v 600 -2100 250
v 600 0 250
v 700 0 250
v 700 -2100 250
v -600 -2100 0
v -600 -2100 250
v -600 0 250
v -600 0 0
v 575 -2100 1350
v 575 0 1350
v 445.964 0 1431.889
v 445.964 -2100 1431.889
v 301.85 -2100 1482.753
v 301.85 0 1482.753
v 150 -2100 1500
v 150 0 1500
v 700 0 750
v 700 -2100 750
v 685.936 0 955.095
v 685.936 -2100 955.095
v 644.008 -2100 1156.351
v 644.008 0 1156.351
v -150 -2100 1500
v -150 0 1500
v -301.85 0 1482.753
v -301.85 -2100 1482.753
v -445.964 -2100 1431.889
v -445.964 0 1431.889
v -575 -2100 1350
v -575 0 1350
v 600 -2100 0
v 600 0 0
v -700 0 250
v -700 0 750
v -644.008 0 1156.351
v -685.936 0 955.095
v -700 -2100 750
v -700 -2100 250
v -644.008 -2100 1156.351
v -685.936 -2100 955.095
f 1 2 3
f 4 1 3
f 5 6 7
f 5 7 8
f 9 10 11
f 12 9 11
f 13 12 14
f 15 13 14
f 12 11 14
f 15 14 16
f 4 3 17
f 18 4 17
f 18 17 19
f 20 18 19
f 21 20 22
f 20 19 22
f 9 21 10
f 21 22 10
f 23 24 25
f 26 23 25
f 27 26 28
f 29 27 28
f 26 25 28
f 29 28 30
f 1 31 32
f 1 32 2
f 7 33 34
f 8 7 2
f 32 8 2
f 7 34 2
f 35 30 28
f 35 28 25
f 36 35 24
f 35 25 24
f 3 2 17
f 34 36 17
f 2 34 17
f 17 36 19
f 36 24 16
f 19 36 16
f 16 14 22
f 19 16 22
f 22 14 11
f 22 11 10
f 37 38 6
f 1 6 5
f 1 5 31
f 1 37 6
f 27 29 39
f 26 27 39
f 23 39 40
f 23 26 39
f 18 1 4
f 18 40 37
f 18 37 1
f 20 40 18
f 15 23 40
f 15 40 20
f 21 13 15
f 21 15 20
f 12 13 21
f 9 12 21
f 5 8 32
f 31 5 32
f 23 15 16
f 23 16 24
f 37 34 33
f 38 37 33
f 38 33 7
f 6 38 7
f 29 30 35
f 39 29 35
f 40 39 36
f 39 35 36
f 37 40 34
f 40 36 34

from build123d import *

# Parameters (mm, degrees)
F1_DEPTH = 2100


with BuildPart() as f1:
    # F0 (on Front) → F1 (new body)
    with BuildSketch(Plane.XZ):
        with BuildLine():
            Line((-600, 250), (-600, 0))
            Line((-600, 0), (600, 0))
            Line((600, 0), (600, 250))
            Line((600, 250), (700, 250))
            Line((700, 250), (700, 750))
            ThreePointArc((700, 750), (668.418081, 1056.441267), (575, 1350))
            ThreePointArc((575, 1350), (375.346955, 1461.399705), (150, 1500))
            Line((150, 1500), (-150, 1500))
            ThreePointArc((-150, 1500), (-375.346955, 1461.399705), (-575, 1350))
            ThreePointArc((-575, 1350), (-668.418081, 1056.441267), (-700, 750))
            Line((-700, 750), (-700, 250))
            Line((-700, 250), (-600, 250))
        make_face()
    extrude(amount=F1_DEPTH)


solid = f1.part
